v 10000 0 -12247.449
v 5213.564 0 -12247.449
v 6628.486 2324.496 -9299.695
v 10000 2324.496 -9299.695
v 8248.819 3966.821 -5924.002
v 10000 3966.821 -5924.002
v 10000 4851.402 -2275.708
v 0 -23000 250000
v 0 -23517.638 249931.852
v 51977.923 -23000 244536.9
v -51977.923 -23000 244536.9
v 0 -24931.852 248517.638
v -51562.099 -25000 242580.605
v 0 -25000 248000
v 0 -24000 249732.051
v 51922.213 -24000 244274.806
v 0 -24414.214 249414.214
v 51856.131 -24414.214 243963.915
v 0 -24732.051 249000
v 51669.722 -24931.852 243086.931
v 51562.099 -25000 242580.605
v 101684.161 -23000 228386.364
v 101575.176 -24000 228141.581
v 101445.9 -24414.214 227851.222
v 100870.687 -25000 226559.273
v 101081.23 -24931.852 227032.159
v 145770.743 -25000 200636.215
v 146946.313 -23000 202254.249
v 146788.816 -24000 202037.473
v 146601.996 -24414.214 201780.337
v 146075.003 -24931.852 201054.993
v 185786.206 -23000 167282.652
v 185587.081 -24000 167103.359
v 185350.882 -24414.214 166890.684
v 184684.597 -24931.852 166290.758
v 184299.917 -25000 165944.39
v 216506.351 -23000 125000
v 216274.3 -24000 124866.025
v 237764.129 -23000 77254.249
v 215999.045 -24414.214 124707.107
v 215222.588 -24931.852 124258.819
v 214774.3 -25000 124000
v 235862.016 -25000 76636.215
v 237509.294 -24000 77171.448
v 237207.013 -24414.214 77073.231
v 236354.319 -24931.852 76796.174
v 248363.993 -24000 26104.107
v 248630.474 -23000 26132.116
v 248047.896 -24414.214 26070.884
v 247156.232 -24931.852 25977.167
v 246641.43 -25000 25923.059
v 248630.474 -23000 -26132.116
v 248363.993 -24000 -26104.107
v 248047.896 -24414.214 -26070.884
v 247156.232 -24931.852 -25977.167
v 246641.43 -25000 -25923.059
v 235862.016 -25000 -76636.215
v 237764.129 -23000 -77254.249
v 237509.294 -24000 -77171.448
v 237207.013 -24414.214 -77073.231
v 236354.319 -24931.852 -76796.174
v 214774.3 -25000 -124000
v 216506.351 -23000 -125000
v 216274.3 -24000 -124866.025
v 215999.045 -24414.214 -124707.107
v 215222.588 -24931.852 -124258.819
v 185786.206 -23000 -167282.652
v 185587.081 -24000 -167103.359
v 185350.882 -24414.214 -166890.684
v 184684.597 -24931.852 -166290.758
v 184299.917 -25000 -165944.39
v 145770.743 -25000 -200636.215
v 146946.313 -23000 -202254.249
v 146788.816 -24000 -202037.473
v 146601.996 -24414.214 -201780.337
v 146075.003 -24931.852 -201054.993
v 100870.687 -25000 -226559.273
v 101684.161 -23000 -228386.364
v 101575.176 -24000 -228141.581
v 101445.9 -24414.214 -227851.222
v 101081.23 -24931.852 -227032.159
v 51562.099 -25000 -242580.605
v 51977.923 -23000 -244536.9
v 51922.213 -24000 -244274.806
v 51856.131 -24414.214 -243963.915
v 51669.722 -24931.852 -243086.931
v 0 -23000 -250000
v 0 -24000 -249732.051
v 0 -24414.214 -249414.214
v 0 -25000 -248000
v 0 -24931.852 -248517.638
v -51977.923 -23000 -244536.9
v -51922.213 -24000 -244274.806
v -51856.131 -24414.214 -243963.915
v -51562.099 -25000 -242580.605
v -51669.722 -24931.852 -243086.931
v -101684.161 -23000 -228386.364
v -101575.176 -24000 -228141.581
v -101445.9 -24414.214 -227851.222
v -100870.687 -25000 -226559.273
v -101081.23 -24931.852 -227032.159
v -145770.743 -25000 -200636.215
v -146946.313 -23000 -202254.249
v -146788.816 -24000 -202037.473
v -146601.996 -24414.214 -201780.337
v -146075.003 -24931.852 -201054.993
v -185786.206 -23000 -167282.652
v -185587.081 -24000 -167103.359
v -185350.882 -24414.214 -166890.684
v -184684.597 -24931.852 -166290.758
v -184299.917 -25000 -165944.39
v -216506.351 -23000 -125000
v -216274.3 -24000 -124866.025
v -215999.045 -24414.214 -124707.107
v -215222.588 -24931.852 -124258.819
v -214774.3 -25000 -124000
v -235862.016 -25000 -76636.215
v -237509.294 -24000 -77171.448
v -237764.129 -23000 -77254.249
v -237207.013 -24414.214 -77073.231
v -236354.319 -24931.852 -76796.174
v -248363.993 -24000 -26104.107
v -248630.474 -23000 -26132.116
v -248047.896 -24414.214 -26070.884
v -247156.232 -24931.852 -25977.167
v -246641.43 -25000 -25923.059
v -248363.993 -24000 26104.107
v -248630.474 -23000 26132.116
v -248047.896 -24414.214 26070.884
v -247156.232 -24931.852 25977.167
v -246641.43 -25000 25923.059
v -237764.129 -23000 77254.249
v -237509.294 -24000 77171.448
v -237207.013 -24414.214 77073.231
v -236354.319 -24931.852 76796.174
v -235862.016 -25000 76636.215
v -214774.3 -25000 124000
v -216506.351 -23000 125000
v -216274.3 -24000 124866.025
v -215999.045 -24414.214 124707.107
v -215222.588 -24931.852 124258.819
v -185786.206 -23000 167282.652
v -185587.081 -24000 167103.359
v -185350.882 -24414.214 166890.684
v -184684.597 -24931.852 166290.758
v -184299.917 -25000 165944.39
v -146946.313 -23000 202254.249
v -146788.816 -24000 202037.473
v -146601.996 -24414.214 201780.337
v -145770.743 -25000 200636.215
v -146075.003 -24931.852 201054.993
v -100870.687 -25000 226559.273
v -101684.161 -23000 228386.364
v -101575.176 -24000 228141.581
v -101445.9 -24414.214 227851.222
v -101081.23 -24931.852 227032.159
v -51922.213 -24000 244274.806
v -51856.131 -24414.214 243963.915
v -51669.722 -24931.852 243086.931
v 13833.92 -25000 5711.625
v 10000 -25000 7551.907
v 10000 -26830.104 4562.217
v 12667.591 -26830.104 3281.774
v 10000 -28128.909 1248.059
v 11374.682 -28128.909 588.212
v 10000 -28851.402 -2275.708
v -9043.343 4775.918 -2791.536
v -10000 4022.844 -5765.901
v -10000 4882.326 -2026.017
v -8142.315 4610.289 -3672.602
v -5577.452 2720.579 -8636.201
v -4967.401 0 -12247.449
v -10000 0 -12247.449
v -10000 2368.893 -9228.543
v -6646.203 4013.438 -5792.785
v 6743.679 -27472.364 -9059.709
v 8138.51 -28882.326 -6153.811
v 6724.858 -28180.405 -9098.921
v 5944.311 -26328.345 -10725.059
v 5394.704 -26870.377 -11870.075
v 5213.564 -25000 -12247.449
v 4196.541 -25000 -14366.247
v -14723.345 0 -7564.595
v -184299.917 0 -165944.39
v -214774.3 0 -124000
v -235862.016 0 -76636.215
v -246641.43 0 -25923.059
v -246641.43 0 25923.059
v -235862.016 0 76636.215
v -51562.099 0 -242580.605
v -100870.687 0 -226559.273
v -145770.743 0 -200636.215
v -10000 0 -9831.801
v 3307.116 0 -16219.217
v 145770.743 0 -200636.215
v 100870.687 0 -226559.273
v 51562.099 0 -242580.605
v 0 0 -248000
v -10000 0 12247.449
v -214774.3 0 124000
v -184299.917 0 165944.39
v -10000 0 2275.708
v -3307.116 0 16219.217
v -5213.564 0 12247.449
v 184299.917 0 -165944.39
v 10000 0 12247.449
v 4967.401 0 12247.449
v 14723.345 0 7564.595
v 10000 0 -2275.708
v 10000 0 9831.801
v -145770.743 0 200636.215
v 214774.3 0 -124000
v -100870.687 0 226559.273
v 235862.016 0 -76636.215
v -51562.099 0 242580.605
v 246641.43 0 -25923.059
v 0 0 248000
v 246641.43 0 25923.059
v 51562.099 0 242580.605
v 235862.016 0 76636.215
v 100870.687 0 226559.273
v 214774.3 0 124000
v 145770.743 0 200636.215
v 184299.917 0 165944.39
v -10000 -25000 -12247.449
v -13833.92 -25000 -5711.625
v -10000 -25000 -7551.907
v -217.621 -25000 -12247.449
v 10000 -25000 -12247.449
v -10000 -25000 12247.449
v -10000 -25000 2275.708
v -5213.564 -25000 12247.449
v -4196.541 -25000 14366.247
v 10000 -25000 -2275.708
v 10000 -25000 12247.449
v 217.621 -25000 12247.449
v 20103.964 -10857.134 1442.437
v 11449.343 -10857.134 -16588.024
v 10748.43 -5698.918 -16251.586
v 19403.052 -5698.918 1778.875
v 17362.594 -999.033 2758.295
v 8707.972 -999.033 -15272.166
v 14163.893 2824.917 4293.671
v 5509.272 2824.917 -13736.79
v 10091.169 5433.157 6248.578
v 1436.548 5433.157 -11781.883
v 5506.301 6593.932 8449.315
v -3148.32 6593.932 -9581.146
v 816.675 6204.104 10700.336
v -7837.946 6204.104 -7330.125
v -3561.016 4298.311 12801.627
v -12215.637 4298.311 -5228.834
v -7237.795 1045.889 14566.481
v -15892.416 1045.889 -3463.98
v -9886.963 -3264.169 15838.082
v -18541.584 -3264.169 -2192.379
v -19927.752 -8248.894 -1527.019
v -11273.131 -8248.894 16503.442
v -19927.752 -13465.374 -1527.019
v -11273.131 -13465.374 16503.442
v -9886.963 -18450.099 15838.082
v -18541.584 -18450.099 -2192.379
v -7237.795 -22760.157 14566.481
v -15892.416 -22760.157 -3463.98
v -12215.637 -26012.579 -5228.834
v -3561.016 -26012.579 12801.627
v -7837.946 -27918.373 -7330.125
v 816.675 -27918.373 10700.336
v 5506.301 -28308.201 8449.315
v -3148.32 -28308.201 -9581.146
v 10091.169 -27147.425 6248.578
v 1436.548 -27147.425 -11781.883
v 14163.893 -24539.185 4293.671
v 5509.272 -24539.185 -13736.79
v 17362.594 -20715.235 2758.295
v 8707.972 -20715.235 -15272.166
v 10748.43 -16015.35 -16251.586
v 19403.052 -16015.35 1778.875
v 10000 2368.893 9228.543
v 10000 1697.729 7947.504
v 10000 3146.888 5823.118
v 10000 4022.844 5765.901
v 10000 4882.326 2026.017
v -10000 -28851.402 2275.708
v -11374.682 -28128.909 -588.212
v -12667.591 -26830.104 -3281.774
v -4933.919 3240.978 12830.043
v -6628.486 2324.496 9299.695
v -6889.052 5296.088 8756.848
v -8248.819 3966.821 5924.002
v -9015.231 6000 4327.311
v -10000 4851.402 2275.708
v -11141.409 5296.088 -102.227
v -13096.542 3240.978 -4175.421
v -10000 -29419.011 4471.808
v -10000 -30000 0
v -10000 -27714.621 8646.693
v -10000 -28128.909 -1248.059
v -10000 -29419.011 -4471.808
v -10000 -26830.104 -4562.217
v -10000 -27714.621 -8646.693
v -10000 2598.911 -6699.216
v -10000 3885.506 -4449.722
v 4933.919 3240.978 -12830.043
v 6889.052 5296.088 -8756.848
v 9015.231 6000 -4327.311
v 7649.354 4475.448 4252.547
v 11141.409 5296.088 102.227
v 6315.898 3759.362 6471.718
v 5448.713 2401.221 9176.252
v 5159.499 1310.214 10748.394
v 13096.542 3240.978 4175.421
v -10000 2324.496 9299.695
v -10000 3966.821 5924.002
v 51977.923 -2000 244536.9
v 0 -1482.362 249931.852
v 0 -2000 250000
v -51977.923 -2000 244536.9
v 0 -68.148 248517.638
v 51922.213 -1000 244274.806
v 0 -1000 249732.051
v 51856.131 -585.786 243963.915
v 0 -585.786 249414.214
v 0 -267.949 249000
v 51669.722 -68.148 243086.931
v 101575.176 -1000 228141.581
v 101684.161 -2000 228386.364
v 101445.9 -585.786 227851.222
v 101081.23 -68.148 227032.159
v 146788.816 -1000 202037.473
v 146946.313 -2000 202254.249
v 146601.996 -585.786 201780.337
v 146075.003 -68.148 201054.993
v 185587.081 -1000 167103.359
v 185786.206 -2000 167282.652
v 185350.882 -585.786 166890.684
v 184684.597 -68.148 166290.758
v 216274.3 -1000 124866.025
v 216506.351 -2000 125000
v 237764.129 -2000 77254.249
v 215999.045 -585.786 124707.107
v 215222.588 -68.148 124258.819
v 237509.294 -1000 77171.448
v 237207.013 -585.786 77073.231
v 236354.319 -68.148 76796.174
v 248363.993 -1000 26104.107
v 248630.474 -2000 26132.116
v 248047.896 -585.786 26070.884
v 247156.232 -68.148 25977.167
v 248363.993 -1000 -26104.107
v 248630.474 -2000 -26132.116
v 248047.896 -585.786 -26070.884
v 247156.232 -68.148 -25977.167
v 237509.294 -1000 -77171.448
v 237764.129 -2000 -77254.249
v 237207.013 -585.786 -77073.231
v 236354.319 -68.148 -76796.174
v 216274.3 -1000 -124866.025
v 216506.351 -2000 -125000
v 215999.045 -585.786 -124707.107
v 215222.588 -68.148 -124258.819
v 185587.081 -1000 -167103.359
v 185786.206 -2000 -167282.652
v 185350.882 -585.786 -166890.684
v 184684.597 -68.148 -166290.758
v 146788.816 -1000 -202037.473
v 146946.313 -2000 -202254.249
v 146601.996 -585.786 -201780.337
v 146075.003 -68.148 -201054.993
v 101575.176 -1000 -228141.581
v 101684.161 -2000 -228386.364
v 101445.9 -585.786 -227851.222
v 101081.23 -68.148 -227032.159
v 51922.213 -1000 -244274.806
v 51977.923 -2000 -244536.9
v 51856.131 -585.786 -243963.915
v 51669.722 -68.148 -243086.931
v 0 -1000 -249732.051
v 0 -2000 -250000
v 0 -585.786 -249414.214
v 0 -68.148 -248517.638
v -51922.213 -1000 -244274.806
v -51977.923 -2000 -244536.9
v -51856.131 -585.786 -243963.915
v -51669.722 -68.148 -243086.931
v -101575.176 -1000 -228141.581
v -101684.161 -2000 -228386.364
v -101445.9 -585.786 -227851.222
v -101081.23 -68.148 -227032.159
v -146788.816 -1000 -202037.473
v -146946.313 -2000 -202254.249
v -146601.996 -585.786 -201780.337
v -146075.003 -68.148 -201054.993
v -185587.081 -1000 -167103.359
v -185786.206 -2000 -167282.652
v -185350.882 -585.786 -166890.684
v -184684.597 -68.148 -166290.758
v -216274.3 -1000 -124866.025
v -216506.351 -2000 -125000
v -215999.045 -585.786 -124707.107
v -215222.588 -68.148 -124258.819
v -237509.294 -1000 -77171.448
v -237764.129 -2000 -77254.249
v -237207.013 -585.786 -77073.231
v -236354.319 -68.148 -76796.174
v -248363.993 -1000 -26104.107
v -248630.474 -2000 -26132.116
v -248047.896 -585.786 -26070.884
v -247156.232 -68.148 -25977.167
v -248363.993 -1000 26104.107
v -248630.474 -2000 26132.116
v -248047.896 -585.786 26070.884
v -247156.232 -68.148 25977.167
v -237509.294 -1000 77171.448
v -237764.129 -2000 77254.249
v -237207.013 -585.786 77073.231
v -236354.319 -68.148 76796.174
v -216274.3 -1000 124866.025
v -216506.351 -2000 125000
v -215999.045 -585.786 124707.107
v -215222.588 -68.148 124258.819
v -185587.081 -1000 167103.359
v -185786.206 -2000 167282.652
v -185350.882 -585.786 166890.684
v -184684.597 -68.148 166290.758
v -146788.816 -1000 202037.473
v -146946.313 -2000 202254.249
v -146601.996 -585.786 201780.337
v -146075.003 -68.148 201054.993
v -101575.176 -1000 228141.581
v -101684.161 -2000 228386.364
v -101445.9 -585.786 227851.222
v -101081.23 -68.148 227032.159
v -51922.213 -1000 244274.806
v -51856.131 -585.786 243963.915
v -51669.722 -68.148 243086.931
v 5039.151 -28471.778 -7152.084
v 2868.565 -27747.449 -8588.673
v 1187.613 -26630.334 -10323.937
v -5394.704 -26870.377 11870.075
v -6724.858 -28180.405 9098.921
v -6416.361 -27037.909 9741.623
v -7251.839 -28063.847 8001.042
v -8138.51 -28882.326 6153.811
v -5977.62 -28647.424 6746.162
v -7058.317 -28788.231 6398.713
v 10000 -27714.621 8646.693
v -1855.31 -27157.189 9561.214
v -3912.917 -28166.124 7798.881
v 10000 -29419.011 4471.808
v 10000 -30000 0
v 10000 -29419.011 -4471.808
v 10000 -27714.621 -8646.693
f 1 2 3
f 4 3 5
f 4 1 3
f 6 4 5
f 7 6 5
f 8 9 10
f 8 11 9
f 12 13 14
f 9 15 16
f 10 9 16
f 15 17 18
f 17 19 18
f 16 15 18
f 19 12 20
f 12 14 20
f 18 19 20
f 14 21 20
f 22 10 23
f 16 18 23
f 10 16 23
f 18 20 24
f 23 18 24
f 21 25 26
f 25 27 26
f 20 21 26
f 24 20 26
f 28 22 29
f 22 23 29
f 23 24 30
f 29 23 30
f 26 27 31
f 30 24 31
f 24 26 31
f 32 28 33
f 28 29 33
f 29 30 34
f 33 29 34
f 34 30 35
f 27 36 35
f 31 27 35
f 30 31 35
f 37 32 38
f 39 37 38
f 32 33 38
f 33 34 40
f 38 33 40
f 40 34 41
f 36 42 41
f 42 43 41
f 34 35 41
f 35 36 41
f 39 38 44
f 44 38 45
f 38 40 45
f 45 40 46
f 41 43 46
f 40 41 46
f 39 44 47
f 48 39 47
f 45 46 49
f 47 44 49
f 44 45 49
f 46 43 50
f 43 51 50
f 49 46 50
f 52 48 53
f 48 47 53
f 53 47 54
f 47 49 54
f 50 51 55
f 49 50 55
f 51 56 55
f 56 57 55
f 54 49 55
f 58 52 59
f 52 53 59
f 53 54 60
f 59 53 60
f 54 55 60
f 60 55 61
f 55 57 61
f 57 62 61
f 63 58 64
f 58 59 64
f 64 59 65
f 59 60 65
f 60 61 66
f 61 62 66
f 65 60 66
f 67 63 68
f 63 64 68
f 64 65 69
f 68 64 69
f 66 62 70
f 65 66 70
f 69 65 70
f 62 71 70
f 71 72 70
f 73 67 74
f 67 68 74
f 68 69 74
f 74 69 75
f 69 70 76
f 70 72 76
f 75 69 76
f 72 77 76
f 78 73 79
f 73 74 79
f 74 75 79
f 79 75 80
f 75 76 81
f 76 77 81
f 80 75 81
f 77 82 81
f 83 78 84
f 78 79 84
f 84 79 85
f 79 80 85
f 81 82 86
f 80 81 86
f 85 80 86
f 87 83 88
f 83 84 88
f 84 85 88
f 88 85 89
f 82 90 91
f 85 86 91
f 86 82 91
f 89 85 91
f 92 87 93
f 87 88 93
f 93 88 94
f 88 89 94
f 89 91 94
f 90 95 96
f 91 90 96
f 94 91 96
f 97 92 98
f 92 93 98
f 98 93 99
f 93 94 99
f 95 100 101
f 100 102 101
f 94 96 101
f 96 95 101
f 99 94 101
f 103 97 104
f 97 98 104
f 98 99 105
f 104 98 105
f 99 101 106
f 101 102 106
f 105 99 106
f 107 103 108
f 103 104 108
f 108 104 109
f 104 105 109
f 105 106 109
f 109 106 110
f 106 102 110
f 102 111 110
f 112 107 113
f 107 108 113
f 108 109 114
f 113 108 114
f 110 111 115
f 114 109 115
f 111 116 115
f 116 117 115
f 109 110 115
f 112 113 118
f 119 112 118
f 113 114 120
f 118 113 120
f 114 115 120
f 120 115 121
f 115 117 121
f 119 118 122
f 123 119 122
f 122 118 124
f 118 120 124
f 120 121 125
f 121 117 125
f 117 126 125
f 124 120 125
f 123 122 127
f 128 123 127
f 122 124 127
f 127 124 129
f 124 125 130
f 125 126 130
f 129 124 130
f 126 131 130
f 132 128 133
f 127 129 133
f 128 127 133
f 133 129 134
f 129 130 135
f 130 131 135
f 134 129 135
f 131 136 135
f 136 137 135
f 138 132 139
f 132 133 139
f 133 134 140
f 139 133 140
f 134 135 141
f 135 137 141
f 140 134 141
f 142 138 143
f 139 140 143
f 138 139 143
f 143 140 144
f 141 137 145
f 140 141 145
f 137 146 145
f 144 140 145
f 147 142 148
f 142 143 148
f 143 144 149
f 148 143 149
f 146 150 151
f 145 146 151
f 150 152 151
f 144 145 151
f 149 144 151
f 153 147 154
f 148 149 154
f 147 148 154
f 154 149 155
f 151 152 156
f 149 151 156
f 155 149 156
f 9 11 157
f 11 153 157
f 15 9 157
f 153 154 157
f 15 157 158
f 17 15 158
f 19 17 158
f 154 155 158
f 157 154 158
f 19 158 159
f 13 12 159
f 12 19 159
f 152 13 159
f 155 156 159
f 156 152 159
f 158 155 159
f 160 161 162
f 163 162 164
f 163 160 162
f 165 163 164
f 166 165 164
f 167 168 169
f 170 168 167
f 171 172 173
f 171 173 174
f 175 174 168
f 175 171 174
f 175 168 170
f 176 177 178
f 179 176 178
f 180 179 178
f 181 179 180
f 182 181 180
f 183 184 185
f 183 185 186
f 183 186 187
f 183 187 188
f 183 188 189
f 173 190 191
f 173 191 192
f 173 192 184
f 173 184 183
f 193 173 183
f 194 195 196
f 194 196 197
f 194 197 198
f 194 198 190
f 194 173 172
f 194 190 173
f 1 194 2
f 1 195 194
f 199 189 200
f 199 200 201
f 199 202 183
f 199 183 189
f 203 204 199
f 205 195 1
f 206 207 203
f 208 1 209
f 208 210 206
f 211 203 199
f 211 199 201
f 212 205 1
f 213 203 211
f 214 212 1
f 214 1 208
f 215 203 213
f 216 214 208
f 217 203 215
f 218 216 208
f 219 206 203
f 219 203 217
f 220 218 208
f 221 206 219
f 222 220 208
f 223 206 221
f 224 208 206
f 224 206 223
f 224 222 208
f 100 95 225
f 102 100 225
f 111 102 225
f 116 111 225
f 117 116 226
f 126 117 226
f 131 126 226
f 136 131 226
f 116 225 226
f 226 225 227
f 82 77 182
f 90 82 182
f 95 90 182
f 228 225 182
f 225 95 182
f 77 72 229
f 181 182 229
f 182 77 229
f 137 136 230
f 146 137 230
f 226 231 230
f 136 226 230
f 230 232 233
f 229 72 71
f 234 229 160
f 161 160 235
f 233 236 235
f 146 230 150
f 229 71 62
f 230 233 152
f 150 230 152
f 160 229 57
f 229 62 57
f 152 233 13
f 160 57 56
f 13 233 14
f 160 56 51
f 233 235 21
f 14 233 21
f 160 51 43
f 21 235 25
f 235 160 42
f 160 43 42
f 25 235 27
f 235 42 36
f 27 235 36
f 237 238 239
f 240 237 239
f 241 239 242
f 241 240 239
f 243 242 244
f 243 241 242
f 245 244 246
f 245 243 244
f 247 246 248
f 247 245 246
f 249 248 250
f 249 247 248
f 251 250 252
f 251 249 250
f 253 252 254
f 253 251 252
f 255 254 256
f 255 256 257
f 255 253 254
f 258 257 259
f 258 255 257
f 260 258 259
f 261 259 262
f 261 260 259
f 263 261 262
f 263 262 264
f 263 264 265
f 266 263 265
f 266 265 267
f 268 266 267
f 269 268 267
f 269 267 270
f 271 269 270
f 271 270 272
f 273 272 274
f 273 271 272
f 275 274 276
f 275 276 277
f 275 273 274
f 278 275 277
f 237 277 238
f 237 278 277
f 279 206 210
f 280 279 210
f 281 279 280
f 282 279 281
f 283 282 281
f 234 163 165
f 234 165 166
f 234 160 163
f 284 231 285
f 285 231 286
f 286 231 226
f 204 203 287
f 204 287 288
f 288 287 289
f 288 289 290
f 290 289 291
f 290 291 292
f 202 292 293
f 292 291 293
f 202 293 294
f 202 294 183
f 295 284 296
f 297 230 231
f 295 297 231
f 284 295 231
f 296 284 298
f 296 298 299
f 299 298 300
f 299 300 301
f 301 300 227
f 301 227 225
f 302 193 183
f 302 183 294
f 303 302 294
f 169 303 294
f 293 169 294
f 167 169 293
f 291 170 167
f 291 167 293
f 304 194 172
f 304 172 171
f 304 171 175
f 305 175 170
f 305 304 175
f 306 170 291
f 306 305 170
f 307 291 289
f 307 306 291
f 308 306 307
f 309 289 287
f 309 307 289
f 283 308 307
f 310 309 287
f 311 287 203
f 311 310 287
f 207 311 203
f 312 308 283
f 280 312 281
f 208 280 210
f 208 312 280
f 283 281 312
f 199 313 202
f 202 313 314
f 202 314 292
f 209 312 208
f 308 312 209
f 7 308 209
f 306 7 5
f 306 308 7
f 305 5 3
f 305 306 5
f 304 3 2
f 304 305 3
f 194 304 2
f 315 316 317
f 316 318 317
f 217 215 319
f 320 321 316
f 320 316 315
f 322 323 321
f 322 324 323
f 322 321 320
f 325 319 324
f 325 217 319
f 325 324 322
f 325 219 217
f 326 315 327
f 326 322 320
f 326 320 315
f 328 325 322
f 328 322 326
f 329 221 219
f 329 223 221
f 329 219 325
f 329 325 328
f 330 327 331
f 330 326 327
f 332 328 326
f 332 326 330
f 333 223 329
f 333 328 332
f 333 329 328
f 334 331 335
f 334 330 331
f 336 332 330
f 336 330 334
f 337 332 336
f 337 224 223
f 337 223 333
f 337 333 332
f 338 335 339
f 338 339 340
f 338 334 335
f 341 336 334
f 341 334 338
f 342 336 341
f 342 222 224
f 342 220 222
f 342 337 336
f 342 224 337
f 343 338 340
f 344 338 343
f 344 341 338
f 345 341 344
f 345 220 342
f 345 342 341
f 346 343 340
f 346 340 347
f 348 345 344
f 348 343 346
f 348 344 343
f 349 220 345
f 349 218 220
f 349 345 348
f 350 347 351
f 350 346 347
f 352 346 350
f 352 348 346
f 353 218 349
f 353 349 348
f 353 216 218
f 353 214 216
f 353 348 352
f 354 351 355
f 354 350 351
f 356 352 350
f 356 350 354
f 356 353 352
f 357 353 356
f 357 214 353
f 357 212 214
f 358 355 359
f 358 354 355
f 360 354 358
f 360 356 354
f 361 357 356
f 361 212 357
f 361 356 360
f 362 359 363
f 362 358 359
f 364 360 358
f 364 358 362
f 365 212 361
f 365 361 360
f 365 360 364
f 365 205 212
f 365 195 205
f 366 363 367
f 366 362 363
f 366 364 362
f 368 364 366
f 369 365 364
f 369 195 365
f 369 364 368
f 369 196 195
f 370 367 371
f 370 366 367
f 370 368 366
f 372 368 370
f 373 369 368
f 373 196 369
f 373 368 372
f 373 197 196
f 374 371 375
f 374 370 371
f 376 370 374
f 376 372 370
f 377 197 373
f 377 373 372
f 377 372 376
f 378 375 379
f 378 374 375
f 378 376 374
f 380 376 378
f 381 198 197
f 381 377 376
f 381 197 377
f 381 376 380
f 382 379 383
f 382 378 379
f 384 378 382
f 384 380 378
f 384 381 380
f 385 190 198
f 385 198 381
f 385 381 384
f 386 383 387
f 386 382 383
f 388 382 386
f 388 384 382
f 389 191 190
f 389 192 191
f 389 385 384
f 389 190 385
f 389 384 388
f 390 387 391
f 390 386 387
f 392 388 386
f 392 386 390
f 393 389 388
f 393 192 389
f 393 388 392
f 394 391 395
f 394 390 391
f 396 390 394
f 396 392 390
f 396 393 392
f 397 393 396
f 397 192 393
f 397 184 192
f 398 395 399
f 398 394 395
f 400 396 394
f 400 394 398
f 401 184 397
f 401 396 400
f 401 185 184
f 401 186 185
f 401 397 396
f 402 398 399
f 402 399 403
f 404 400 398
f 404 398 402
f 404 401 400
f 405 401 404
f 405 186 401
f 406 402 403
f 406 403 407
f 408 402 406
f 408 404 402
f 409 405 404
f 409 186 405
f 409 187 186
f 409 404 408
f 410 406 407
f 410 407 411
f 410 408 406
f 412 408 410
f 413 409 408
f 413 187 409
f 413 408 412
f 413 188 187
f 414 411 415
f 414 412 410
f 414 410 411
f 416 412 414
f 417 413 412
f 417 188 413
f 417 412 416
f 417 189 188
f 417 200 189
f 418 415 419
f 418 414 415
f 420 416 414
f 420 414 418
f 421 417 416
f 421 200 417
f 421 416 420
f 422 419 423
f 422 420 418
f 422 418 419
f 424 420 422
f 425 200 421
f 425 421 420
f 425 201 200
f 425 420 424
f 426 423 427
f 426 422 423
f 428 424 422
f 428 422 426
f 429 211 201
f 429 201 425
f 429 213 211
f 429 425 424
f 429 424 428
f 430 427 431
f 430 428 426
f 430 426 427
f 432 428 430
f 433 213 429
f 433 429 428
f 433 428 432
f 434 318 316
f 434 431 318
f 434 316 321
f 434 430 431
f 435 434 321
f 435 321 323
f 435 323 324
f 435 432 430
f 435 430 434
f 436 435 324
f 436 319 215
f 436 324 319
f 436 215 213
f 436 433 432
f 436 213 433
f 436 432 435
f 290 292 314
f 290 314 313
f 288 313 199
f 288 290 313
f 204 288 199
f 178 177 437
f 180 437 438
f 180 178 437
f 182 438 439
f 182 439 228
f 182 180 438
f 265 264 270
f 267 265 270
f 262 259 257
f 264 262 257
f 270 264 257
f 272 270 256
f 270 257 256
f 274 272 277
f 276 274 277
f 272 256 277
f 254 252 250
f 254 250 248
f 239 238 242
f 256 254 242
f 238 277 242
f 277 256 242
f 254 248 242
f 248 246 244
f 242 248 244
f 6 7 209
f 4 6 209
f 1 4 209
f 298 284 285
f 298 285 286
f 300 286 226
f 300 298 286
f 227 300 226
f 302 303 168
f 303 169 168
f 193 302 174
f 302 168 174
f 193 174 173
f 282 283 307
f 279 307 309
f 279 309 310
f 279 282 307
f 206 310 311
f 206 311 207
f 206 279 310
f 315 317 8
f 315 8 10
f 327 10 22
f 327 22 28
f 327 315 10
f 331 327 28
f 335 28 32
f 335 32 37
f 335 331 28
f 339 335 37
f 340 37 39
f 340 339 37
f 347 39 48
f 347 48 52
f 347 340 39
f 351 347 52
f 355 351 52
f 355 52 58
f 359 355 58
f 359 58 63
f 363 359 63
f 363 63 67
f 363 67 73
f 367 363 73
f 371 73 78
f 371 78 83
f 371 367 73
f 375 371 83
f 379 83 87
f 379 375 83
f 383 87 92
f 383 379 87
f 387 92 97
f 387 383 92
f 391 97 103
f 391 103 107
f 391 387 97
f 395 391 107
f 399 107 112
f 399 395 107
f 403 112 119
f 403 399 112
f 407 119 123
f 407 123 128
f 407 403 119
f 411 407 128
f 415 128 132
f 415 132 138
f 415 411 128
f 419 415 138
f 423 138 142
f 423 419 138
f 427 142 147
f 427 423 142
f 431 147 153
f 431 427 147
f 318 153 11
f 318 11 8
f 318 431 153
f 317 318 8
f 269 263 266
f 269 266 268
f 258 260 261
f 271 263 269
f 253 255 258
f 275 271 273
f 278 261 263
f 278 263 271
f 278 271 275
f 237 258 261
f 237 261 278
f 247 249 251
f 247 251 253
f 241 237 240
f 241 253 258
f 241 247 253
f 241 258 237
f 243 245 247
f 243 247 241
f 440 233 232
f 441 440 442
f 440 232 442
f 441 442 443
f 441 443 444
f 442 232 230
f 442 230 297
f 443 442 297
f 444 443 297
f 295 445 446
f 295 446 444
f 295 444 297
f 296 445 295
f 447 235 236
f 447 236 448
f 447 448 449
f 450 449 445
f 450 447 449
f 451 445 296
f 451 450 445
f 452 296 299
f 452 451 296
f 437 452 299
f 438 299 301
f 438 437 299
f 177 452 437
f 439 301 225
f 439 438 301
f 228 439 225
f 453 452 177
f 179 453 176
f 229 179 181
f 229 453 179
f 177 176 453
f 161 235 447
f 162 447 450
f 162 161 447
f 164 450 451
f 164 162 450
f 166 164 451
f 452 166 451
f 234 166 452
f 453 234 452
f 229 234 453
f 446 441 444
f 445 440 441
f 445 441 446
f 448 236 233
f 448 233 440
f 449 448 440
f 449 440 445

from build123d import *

# Parameters (mm, degrees)
SKETCH1_R           = 250000
BOSS_EXTRUDE1_DEPTH = 25000
FILLET1_R           = 2000
SKETCH2_R           = 17500
BOSS_EXTRUDE2_DEPTH = 10000
SKETCH4_R           = 17500
BOSS_EXTRUDE3_DEPTH = 10000
SKETCH5_R           = 17500
BOSS_EXTRUDE4_DEPTH = 10000


with BuildPart() as part:
    # Sketch1 → Boss-Extrude1 (new body)
    with BuildSketch(Plane(origin=(0, 0, 0), x_dir=(1, 0, 0), z_dir=(0, 1, 0))):
        with Locations(Location((0, 0, 0), (0, 0, 270))):
            Circle(SKETCH1_R)
    extrude(amount=-BOSS_EXTRUDE1_DEPTH)

    # Fillet1
    fillet1_edges = [part.edges().sort_by_distance(p)[0] for p in [
        (0, 0, -250000),
        (0, -25000, -250000),
    ]]
    fillet(fillet1_edges, radius=FILLET1_R)

    # Sketch2 → Boss-Extrude2 (add, symmetric)
    with BuildSketch(Plane(origin=(0, 0, 0), x_dir=(0, 0, -1), z_dir=(1, 0, 0))):
        with Locations((0, -12500)):
            Circle(SKETCH2_R)
    extrude(amount=BOSS_EXTRUDE2_DEPTH, both=True)

    # Sketch5 → Boss-Extrude4 (add, symmetric)
    with BuildSketch(Plane(origin=(0, 0, 0), x_dir=(-0.432731067584773, 0, -0.9015230574682729), z_dir=(0.9015230574682729, 0, -0.432731067584773))):
        with Locations((0, -11500)):
            Circle(SKETCH5_R)
    extrude(amount=BOSS_EXTRUDE4_DEPTH, both=True)


with BuildPart() as body_2:
    # Sketch4 → Boss-Extrude3 (new, symmetric)
    with BuildSketch(Plane(origin=(0, 0, 0), x_dir=(0.9015230574682728, 0, -0.4327310675847731), z_dir=(0.4327310675847731, 0, 0.9015230574682728))):
        with Locations((0, -10857.13405129)):
            Circle(SKETCH4_R)
    extrude(amount=BOSS_EXTRUDE3_DEPTH, both=True)


solid = Compound([part.part, body_2.part])
